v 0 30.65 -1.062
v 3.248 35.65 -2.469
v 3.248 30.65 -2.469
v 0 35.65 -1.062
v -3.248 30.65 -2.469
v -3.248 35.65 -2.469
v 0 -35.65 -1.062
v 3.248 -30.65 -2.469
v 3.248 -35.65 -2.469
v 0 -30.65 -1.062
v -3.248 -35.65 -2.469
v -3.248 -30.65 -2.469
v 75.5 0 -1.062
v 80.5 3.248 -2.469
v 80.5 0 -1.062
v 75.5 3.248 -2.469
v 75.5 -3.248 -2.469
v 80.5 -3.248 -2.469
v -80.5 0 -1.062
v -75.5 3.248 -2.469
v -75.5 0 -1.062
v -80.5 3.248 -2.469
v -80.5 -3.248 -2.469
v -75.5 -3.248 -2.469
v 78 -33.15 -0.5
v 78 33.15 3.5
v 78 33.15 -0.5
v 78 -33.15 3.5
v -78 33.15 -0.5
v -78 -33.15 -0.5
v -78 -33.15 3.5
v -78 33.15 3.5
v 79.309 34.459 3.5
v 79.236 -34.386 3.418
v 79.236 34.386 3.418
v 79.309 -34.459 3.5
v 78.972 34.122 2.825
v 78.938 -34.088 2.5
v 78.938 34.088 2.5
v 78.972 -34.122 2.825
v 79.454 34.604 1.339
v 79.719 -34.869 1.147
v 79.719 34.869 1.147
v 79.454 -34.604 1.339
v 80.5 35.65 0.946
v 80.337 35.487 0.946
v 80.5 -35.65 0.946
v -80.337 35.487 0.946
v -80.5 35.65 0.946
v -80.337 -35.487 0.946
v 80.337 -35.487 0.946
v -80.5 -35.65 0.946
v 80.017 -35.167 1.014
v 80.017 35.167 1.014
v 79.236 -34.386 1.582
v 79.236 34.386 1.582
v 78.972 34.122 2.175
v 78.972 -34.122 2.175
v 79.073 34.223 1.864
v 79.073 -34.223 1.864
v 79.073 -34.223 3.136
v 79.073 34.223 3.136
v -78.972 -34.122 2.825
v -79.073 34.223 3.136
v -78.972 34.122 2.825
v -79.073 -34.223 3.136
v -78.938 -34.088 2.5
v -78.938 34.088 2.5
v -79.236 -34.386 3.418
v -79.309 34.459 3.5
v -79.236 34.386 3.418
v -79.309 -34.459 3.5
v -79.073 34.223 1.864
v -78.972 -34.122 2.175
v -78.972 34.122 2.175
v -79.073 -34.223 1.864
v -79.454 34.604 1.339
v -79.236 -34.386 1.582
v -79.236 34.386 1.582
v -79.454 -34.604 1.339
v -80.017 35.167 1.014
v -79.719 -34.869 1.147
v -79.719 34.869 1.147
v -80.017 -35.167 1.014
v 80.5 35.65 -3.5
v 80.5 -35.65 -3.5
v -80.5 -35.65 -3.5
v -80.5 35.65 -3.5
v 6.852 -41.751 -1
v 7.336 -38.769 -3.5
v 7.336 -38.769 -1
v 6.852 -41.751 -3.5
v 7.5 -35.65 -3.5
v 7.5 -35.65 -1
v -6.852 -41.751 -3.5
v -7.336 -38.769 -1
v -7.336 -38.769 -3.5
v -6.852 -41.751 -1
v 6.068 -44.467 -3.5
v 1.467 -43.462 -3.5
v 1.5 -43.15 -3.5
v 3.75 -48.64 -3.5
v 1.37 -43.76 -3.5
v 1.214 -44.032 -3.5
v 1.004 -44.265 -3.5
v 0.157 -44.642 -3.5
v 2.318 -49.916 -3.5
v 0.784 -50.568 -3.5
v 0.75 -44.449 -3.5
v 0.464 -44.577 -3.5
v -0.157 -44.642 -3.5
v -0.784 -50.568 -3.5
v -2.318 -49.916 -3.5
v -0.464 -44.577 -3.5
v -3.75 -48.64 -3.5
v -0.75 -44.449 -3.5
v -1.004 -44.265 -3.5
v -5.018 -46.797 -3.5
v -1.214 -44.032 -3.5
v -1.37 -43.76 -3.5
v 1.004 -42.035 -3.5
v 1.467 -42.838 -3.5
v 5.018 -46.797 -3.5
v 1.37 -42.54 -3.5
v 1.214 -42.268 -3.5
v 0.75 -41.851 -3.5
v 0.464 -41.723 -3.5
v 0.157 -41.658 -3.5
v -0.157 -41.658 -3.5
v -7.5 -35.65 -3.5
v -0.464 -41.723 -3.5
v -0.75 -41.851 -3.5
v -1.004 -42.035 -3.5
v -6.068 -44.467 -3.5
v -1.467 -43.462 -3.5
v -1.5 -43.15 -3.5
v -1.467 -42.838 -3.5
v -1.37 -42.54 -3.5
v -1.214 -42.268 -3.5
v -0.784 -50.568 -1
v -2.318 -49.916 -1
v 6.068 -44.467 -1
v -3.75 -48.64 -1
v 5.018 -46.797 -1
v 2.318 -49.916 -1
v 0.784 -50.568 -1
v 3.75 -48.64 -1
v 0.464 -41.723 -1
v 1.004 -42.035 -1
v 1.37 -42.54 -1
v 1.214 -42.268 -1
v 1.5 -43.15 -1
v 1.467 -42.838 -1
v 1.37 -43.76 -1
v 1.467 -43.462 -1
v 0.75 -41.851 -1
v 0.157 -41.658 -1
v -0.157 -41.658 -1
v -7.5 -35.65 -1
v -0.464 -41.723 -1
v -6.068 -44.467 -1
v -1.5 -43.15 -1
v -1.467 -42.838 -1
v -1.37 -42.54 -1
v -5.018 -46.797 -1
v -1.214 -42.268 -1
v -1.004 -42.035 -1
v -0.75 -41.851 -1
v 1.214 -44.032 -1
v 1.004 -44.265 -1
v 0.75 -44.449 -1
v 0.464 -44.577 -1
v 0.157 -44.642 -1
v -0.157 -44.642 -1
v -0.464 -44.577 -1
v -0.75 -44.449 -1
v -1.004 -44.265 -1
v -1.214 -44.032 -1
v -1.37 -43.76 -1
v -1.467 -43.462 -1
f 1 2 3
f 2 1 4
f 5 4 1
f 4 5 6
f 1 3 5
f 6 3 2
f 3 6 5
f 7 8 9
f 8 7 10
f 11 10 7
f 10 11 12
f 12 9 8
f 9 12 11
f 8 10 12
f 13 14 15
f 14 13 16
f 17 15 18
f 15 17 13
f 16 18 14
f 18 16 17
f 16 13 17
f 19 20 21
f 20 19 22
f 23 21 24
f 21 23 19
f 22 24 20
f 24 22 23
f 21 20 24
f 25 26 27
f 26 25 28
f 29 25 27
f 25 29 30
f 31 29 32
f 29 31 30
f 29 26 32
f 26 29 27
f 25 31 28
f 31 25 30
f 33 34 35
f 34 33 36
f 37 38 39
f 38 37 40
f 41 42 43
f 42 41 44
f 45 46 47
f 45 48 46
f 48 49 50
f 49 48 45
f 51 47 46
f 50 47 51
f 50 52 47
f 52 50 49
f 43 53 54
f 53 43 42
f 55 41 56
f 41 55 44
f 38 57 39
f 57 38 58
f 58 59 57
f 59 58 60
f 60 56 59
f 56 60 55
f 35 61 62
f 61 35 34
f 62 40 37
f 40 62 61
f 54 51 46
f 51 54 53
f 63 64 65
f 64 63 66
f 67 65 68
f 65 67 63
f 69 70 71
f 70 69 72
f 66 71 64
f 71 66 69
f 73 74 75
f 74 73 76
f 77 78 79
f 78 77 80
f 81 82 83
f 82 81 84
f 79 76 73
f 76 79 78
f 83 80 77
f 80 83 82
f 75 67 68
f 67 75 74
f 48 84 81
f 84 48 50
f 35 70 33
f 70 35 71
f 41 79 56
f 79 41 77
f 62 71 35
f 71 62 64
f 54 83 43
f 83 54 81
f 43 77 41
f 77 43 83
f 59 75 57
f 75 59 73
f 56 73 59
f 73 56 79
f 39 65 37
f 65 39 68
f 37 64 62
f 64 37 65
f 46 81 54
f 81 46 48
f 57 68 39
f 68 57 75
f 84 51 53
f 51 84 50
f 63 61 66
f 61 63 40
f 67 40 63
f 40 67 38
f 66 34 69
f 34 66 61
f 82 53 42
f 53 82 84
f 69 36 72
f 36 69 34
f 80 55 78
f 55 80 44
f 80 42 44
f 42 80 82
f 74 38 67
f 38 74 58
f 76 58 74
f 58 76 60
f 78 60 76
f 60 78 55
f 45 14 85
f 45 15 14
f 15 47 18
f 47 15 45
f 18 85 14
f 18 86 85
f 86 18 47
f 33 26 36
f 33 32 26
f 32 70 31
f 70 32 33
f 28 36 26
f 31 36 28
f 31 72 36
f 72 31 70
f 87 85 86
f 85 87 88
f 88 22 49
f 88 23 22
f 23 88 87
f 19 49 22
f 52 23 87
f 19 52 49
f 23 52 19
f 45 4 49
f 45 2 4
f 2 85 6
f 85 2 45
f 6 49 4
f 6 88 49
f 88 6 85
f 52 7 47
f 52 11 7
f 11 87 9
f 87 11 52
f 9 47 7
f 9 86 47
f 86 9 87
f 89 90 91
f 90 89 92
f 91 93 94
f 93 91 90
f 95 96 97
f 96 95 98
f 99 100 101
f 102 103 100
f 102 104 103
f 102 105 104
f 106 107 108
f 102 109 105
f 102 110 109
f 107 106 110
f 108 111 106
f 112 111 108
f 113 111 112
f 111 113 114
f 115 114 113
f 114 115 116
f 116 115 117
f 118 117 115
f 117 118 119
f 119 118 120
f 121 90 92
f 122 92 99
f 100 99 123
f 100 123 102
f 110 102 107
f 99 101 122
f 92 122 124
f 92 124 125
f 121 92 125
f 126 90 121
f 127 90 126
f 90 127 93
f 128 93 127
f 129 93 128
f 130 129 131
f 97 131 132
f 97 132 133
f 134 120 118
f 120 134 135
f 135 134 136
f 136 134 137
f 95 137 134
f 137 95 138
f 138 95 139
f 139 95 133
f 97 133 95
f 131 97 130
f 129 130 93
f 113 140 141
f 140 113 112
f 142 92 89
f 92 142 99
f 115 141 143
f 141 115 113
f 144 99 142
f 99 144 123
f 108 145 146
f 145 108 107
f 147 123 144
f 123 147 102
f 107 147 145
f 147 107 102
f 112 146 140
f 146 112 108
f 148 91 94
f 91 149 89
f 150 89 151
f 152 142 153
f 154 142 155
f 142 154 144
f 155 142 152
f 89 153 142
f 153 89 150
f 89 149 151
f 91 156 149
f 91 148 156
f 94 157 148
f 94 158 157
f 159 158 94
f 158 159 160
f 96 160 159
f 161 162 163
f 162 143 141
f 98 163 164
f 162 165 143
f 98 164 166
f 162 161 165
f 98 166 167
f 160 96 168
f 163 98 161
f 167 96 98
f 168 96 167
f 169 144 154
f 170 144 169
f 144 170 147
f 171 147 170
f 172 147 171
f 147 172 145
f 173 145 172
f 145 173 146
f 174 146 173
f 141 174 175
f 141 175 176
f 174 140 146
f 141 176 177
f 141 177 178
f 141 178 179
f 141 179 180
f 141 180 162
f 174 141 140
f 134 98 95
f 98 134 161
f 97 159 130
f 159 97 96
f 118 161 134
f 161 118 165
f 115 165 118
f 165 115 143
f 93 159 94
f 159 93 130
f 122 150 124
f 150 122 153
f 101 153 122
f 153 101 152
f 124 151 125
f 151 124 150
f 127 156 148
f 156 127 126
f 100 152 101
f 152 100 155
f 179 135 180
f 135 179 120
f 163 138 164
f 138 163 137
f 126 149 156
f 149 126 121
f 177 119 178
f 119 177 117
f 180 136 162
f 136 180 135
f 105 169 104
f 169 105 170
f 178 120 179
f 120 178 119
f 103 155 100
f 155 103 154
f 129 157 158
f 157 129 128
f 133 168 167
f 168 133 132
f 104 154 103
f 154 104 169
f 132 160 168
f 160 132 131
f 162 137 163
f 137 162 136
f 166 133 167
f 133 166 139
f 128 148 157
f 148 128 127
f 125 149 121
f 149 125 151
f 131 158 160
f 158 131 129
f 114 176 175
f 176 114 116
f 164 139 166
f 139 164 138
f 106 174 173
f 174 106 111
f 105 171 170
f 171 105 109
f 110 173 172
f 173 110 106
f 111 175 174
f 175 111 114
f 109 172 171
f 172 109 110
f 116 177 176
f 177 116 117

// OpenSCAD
//------------------Variables------------------\\ 

		//----Global Values----\\
			//The default unit in OpenSCAD is mm and this unit variable allows one to change the variables in the code with units other than mm. Default is 1, for mm, but cm is 10 and inches is 25.4. Note that this entails that you change EVERY variable (except maybe sfn)  so that one piece of the model is not ridiculously bigger/smaller than the other parts. 
				unit=1;

			//The detail in the cylinders/spheres of the shape.
				sfn=30;

		//----Bill Specifics----\\

			//The length of the bill.
				billength= 156;

			//The width of the bill. 
				billwidth = 66.3;

			//The thickness of the frame. 
				framethick = 5;
			
			//Bottom Thickness
				botthick = 2 ;

		//----Frame Specifics----\\

			//The border of the frame length-wise. This is the measurement from the inside of the frame to the outisde on the length (x) axis. The cylinders that shape the frame use this measurement.
				xframe = 5;

			//The border of the frame width-wise. This is the measurement from the inside of the frame to the outisde on the width (y) axis.
				yframe = 5;
		
			//How prominent the frame shaping is. Play with this value. Default is 2.
				frameshapethick = 1.6;

			//How raised the frame shaping is. Play with this value as well. 
				frameshaperaise = 0;
		
	//----Paper clip slit size----\\\
		//Width of the paperclip slit. Adjust this value if as you want. 
		slitwidth = 10;
		
		//Height of the slit. This is actually a size control but it mainly changes the size.
		slitheight = 7.5;

		//Where the slit is. Slit is in the middle by default but depending on size you may have to raise or lower this value.
		slitlift =-4;

		//Shape of slit in sides. Default is 3 (triangle) as its overhangs are not unbearable.
		slitshape=3;

		//Slit scale (x,y,z)
		slitscalex= 0.25;
		slitscaley= 1;
		slitscalez= 1;
	
	//----Hook sizing----\\
		//Hook size
		hooksize=15;

		//Hook hole size
		hookhole=3;

		//Hook thickness
		hookthick=2.5;

//-------------------Modules-------------------\\ 

	//----Basic Frame Shapes----\\
		module bill() {
			cube([billength*unit, billwidth*unit,framethick*unit], center=true);
		}

		module outsideframe() { 
			cube([(billength+xframe)*unit, (billwidth+yframe)*unit, (framethick+botthick)*unit], center=true);
		}

	//----Frame shaping.----\\
		//Frame shaping cylinder on the X Axis.
			module xfsc() {
				cylinder(r=(framethick*unit)/(frameshapethick*2), h=(billwidth+yframe)*unit+xframe, center=true, $fn=sfn);
			}

		//Frame shaping cylinder on the Y Axis.
			module yfsc() {
				cylinder(r=(framethick*unit)/(frameshapethick*2), h=(billength+xframe)*unit+yframe, center=true, $fn=sfn);
			}

		//Frameshaping general module
			module frameshaping() {
				translate([(billength/2)*unit+xframe/2, 0, (framethick/2)*unit]) {
					rotate([90,0,0]) {
						xfsc();
					}
				}
				translate([(-billength/2)*unit-xframe/2, 0, (framethick/2)*unit]) {
					rotate([90,0,0]) {
						xfsc();
					}
				}

				translate([0, (billwidth/2)*unit+yframe/2, (framethick/2)*unit]) {
					rotate([90,0,90]) {
						yfsc();
					}
				}
				translate([0, (-billwidth/2)*unit-yframe/2, (framethick/2)*unit]) {
					rotate([90,0,90]) {
						yfsc();
					}
				}
			}

	



	//A slit on every side for a paper clip to hold it down
	module clipslit() {
		translate([0, ((billwidth+yframe)/2)*unit, slitlift*unit]) {
			rotate([0,270,90]) {
				scale([slitscalex,slitscaley,slitscalez]) {
					cylinder(r=(slitheight/2)*unit, h=slitwidth*unit, $fn=slitshape, center=true);
				}
			}
		}
		translate([0, ((billwidth+yframe)/2)*-unit, slitlift*unit]) {
			rotate([0,270,90]) {
				scale([slitscalex,slitscaley,slitscalez]) {
					cylinder(r=(slitheight/2)*unit, h=slitwidth*unit, $fn=slitshape, center=true);
				}
			}
		}
		translate([((billength+xframe)/2)*unit, 0, slitlift*unit]) {
			rotate([0,270,0]) {
				scale([slitscalex,slitscaley,slitscalez]) {
					cylinder(r=(slitheight/2)*unit, h=slitwidth*unit, $fn=slitshape, center=true);
				}
			}
		}
		translate([-unit*((billength+xframe)/2), 0, slitlift*unit]) {
			rotate([0,270,0]) {
				scale([slitscalex,slitscaley,slitscalez]) {
					cylinder(r=(slitheight/2)*unit, h=slitwidth*unit, $fn=slitshape, center=true);
				}
			}
		}				
	}

		
	module hook() {
		translate([0,-((billwidth+xframe)/2)*unit, (-(framethick+botthick)/2)*unit ]) {
			difference() {
				scale([1,2,1]) {
					cylinder(r=(hooksize/2)*unit, h=hookthick*unit, $fn=sfn);
				}
				translate([(-hooksize/2)*unit, 0]) {
					cube([hooksize*unit, hooksize*unit, hookthick*unit]);
				}
				translate([0, (-hooksize/2)*unit, 0]) {
					cylinder(r=(hookhole/2)*unit, h=hookthick*unit, $fn=sfn);
				}
			}
		}
	}


	//Plating module
	module frame() {
		difference() {
			outsideframe();
			translate([0,0, botthick]) {
				bill();
				clipslit();
			}
			translate([0,0, frameshaperaise]) {
				frameshaping();
			}
		}
	}

frame();
hook();
